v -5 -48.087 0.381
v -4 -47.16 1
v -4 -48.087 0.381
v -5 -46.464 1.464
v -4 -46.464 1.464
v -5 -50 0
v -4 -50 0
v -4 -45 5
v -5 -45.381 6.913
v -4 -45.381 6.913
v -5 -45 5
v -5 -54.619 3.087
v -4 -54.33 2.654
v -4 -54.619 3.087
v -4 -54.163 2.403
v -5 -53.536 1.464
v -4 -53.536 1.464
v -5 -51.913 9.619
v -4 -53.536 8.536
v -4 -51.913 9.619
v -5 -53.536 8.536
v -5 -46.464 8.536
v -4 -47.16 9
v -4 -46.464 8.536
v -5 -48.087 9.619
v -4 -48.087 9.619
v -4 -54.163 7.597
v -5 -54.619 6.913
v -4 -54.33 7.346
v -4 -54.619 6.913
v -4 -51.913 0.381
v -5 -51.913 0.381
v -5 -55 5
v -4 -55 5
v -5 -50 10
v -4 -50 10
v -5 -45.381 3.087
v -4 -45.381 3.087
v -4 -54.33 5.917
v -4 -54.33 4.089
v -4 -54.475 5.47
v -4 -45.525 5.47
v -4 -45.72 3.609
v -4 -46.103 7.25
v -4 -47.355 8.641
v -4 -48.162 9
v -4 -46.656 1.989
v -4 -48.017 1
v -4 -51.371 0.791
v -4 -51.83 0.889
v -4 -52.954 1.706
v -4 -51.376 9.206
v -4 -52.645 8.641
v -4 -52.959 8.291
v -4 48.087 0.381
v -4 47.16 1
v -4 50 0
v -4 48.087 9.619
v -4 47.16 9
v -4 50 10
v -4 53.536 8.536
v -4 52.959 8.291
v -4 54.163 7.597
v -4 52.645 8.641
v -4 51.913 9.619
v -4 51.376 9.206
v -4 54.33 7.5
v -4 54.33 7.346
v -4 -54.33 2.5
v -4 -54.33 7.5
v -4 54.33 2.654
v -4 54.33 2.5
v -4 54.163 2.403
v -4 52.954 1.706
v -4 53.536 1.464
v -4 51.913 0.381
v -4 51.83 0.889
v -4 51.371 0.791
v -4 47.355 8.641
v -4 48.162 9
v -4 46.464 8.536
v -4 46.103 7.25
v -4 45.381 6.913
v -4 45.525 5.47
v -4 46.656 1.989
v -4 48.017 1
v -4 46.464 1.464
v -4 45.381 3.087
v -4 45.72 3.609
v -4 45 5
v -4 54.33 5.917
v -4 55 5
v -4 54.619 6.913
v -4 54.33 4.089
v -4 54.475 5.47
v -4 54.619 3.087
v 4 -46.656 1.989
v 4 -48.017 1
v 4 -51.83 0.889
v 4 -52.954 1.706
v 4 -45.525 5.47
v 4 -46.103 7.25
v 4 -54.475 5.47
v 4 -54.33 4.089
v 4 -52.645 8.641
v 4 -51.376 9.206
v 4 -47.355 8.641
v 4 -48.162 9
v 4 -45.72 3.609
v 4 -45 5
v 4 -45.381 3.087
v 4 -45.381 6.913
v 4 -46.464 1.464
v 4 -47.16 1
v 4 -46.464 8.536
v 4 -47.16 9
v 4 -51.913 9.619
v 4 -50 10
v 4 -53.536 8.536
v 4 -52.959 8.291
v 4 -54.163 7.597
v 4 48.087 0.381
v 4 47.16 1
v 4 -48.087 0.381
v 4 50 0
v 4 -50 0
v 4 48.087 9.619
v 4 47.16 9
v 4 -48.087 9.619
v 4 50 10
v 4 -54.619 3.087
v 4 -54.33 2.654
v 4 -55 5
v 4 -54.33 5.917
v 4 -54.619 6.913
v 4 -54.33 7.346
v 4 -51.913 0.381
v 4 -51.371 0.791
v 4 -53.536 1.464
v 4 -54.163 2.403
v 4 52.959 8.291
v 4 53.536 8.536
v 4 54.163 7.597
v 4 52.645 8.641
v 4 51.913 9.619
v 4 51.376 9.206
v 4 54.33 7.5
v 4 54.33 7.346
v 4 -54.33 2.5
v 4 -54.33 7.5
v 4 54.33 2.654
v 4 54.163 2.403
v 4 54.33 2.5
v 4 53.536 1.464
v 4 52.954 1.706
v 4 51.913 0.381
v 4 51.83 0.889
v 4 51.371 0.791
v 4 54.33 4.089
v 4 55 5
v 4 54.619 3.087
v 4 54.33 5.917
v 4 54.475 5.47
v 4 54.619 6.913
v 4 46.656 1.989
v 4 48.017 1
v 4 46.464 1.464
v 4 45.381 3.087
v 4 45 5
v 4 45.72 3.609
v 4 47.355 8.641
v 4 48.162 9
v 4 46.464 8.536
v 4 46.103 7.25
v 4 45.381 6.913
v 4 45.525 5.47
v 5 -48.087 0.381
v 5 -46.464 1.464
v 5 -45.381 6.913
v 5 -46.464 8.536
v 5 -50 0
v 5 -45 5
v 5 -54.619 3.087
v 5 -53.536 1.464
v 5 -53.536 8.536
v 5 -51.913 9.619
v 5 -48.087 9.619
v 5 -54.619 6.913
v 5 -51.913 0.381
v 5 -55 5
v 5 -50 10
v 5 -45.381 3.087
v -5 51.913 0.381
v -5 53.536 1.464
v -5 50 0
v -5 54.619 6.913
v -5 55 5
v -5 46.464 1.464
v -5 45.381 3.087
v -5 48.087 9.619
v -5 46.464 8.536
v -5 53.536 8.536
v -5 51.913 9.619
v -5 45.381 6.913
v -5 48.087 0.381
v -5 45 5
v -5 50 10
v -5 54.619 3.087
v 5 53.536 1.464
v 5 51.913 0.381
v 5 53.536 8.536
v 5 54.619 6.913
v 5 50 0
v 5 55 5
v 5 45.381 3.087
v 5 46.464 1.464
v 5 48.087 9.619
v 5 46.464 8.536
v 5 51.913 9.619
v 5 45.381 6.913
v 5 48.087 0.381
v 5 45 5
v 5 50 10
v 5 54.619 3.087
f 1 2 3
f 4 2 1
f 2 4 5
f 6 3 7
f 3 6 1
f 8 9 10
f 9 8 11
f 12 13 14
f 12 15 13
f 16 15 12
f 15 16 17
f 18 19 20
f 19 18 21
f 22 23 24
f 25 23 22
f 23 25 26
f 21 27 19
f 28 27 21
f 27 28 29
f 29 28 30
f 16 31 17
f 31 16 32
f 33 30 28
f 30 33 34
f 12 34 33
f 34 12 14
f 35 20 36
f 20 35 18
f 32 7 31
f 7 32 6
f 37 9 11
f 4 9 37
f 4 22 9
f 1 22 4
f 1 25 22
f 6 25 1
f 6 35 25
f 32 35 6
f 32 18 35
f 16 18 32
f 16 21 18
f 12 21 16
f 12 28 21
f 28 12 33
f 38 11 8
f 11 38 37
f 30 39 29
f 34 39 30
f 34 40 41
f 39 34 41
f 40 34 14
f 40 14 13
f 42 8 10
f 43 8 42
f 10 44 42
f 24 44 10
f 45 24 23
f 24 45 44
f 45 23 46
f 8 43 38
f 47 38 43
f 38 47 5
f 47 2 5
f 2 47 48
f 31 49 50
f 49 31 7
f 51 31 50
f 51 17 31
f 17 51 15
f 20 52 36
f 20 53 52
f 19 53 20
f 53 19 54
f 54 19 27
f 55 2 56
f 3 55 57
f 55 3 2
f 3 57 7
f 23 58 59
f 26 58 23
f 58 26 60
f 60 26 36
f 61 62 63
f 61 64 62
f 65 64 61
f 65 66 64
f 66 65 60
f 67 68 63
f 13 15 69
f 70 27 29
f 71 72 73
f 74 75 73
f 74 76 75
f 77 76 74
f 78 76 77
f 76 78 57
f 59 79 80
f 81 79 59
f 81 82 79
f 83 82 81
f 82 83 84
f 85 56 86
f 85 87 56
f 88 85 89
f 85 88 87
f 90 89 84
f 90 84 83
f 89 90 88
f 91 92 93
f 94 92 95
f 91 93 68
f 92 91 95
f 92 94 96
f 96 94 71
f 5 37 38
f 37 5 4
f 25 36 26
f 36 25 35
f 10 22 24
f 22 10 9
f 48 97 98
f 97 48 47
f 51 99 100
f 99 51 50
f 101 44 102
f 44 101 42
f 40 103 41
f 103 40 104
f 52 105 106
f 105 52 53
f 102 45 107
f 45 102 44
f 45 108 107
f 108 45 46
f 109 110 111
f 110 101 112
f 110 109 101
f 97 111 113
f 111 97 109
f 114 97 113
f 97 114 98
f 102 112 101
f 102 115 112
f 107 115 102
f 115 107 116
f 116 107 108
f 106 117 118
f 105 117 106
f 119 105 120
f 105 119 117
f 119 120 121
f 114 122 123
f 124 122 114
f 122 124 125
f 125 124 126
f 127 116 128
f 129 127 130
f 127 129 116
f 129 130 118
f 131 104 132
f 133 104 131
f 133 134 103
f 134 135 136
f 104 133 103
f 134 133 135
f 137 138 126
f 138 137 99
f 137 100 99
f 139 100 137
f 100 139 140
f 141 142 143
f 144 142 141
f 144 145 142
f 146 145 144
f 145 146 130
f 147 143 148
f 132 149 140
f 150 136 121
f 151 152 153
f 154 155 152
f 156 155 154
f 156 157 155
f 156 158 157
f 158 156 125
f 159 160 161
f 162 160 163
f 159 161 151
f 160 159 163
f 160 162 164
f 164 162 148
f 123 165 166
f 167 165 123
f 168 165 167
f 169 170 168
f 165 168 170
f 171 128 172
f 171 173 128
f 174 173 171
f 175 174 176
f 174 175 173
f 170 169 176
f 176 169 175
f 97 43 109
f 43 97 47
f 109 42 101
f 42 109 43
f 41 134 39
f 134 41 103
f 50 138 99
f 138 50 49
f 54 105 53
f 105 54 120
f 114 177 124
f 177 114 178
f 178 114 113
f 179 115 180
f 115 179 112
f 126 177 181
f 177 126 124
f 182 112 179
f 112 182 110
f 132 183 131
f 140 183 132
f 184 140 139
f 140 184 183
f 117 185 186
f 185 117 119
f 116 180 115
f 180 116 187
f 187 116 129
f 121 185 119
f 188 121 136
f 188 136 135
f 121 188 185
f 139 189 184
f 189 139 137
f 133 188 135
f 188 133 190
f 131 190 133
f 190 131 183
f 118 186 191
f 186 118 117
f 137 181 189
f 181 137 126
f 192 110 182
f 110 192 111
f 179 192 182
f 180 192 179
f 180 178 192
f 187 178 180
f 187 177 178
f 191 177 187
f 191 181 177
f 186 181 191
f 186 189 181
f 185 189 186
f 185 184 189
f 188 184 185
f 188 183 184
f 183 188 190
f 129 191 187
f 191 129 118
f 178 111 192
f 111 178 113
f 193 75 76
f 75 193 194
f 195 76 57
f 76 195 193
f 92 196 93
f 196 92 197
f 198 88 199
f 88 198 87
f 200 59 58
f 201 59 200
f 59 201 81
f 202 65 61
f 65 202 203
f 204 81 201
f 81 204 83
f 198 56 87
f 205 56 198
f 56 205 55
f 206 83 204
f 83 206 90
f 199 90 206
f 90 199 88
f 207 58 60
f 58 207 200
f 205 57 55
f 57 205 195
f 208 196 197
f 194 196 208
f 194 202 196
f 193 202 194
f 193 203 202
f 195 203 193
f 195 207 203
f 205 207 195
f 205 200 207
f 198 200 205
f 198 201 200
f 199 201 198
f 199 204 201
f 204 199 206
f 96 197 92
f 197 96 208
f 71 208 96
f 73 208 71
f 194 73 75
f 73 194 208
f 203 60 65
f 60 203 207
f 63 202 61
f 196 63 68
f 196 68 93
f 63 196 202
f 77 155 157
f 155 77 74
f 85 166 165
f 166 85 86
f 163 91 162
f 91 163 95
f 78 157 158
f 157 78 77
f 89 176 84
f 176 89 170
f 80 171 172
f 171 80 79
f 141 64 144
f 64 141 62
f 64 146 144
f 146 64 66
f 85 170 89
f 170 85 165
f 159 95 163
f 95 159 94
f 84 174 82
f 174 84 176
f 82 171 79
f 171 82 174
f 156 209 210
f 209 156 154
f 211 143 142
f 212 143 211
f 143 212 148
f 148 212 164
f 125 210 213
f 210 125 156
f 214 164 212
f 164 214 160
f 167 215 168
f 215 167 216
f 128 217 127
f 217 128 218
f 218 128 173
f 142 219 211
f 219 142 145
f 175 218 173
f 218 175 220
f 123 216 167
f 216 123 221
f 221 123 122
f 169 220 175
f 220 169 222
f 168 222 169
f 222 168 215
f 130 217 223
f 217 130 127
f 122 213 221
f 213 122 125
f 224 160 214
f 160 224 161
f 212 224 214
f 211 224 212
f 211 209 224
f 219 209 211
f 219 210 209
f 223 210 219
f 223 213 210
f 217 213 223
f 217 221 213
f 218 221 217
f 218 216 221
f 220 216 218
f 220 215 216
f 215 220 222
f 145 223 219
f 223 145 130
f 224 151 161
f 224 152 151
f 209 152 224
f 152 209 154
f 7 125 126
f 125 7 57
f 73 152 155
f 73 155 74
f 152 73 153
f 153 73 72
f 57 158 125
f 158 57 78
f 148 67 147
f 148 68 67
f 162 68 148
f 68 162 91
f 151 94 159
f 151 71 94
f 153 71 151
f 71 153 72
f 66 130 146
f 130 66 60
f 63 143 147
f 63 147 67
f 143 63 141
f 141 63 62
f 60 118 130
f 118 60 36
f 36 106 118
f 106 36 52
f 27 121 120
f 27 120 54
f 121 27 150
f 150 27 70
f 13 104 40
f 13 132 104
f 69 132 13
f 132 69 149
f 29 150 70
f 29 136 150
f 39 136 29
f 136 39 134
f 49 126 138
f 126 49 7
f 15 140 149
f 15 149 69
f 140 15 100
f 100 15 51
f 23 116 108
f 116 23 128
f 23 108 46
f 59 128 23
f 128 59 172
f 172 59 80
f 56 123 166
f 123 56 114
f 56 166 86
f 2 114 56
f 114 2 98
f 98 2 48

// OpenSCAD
// file: tank_track.scad
use <tank_wheel.scad>

tank_track(10, 10, 100, 1, 1);

module tank_track(wheel_width, wheel_diameter, track_length, track_thickness, track_inset)
{
    segments = $fn>3 ? $fn : 3;
    
    outer_points = [[-wheel_diameter,-(track_length / 2)],
                    [-wheel_diameter,(track_length / 2)], 
                    for (theta = [90 : -(180/segments) : -90]) 
                        [-wheel_diameter + (wheel_diameter / 2) + (sin(theta) * (wheel_diameter / 2)), (track_length / 2) + cos(theta) * (wheel_diameter / 2)], 
                    [0, (track_length / 2)], 
                    [0, -(track_length / 2)], 
                    for (theta = [-90 : -(180/segments) : -270]) 
                        [-wheel_diameter + (wheel_diameter / 2) + (sin(theta) * (wheel_diameter / 2)), -(track_length / 2) + cos(theta) * (wheel_diameter / 2)]];

    inner_points = [[-wheel_diameter + track_thickness,-(track_length / 2)],
                    [-wheel_diameter + track_thickness,(track_length / 2)], 
                    for (theta = [90 : -(180/segments) : -90]) 
                        [-wheel_diameter + (wheel_diameter / 2) + (sin(theta) * ((wheel_diameter / 2) -track_thickness)), (track_length / 2) + cos(theta) * ((wheel_diameter / 2) -track_thickness)], 
                    [0 - track_thickness, (track_length / 2)], 
                    [0 - track_thickness, -(track_length / 2)], 
                    for (theta = [-90 : -(180/segments) : -270]) 
                        [-wheel_diameter + (wheel_diameter / 2) + (sin(theta) * ((wheel_diameter / 2) -track_thickness)), -(track_length / 2) + cos(theta) * ((wheel_diameter / 2) - track_thickness)]];

    color("black", 1.0)
    translate([-(wheel_width/2) + track_inset, 0, 0])
    rotate([0,90,0])
    linear_extrude(wheel_width - (2 * track_inset), scale = 1.0)
    difference()
    {
        polygon(outer_points);
        polygon(inner_points);
    }
//    polygon(points, paths);
}
// file: tank_wheel.scad
tank_wheel(10, 10, 2, 1);

module tank_wheel(wheel_width, wheel_diameter, track_thickness, track_inset)
{
    translate([-(wheel_width/2), 0 ,wheel_diameter/2])
    rotate([0,90,0])
    {
        linear_extrude(height = track_inset, scale = 1.0)
        circle(d=wheel_diameter, false);
        
        translate([0, 0, track_inset])
        linear_extrude(height = wheel_width - (2 * track_inset), scale = 1.0)
        circle(d=wheel_diameter - track_thickness, false);
        
        translate([0, 0, wheel_width - track_inset])
        linear_extrude(height = track_inset, scale = 1.0)
        circle(d=wheel_diameter, false);
    }
}
// main file
use <tank_wheel.scad>
use <tank_track.scad>

tank_track_assembly(10, 10, 100, 1, 1);

module tank_track_assembly(wheel_width, wheel_diameter, track_length, track_thickness, track_inset)
{
    translate([0, -(track_length/2), 0])
    tank_wheel(wheel_width, wheel_diameter, track_thickness, track_inset);
    
    translate([0, track_length/2, 0])
    tank_wheel(wheel_width, wheel_diameter, track_thickness, track_inset);
    
    tank_track(wheel_width, wheel_diameter, track_length, track_thickness, track_inset);
}
